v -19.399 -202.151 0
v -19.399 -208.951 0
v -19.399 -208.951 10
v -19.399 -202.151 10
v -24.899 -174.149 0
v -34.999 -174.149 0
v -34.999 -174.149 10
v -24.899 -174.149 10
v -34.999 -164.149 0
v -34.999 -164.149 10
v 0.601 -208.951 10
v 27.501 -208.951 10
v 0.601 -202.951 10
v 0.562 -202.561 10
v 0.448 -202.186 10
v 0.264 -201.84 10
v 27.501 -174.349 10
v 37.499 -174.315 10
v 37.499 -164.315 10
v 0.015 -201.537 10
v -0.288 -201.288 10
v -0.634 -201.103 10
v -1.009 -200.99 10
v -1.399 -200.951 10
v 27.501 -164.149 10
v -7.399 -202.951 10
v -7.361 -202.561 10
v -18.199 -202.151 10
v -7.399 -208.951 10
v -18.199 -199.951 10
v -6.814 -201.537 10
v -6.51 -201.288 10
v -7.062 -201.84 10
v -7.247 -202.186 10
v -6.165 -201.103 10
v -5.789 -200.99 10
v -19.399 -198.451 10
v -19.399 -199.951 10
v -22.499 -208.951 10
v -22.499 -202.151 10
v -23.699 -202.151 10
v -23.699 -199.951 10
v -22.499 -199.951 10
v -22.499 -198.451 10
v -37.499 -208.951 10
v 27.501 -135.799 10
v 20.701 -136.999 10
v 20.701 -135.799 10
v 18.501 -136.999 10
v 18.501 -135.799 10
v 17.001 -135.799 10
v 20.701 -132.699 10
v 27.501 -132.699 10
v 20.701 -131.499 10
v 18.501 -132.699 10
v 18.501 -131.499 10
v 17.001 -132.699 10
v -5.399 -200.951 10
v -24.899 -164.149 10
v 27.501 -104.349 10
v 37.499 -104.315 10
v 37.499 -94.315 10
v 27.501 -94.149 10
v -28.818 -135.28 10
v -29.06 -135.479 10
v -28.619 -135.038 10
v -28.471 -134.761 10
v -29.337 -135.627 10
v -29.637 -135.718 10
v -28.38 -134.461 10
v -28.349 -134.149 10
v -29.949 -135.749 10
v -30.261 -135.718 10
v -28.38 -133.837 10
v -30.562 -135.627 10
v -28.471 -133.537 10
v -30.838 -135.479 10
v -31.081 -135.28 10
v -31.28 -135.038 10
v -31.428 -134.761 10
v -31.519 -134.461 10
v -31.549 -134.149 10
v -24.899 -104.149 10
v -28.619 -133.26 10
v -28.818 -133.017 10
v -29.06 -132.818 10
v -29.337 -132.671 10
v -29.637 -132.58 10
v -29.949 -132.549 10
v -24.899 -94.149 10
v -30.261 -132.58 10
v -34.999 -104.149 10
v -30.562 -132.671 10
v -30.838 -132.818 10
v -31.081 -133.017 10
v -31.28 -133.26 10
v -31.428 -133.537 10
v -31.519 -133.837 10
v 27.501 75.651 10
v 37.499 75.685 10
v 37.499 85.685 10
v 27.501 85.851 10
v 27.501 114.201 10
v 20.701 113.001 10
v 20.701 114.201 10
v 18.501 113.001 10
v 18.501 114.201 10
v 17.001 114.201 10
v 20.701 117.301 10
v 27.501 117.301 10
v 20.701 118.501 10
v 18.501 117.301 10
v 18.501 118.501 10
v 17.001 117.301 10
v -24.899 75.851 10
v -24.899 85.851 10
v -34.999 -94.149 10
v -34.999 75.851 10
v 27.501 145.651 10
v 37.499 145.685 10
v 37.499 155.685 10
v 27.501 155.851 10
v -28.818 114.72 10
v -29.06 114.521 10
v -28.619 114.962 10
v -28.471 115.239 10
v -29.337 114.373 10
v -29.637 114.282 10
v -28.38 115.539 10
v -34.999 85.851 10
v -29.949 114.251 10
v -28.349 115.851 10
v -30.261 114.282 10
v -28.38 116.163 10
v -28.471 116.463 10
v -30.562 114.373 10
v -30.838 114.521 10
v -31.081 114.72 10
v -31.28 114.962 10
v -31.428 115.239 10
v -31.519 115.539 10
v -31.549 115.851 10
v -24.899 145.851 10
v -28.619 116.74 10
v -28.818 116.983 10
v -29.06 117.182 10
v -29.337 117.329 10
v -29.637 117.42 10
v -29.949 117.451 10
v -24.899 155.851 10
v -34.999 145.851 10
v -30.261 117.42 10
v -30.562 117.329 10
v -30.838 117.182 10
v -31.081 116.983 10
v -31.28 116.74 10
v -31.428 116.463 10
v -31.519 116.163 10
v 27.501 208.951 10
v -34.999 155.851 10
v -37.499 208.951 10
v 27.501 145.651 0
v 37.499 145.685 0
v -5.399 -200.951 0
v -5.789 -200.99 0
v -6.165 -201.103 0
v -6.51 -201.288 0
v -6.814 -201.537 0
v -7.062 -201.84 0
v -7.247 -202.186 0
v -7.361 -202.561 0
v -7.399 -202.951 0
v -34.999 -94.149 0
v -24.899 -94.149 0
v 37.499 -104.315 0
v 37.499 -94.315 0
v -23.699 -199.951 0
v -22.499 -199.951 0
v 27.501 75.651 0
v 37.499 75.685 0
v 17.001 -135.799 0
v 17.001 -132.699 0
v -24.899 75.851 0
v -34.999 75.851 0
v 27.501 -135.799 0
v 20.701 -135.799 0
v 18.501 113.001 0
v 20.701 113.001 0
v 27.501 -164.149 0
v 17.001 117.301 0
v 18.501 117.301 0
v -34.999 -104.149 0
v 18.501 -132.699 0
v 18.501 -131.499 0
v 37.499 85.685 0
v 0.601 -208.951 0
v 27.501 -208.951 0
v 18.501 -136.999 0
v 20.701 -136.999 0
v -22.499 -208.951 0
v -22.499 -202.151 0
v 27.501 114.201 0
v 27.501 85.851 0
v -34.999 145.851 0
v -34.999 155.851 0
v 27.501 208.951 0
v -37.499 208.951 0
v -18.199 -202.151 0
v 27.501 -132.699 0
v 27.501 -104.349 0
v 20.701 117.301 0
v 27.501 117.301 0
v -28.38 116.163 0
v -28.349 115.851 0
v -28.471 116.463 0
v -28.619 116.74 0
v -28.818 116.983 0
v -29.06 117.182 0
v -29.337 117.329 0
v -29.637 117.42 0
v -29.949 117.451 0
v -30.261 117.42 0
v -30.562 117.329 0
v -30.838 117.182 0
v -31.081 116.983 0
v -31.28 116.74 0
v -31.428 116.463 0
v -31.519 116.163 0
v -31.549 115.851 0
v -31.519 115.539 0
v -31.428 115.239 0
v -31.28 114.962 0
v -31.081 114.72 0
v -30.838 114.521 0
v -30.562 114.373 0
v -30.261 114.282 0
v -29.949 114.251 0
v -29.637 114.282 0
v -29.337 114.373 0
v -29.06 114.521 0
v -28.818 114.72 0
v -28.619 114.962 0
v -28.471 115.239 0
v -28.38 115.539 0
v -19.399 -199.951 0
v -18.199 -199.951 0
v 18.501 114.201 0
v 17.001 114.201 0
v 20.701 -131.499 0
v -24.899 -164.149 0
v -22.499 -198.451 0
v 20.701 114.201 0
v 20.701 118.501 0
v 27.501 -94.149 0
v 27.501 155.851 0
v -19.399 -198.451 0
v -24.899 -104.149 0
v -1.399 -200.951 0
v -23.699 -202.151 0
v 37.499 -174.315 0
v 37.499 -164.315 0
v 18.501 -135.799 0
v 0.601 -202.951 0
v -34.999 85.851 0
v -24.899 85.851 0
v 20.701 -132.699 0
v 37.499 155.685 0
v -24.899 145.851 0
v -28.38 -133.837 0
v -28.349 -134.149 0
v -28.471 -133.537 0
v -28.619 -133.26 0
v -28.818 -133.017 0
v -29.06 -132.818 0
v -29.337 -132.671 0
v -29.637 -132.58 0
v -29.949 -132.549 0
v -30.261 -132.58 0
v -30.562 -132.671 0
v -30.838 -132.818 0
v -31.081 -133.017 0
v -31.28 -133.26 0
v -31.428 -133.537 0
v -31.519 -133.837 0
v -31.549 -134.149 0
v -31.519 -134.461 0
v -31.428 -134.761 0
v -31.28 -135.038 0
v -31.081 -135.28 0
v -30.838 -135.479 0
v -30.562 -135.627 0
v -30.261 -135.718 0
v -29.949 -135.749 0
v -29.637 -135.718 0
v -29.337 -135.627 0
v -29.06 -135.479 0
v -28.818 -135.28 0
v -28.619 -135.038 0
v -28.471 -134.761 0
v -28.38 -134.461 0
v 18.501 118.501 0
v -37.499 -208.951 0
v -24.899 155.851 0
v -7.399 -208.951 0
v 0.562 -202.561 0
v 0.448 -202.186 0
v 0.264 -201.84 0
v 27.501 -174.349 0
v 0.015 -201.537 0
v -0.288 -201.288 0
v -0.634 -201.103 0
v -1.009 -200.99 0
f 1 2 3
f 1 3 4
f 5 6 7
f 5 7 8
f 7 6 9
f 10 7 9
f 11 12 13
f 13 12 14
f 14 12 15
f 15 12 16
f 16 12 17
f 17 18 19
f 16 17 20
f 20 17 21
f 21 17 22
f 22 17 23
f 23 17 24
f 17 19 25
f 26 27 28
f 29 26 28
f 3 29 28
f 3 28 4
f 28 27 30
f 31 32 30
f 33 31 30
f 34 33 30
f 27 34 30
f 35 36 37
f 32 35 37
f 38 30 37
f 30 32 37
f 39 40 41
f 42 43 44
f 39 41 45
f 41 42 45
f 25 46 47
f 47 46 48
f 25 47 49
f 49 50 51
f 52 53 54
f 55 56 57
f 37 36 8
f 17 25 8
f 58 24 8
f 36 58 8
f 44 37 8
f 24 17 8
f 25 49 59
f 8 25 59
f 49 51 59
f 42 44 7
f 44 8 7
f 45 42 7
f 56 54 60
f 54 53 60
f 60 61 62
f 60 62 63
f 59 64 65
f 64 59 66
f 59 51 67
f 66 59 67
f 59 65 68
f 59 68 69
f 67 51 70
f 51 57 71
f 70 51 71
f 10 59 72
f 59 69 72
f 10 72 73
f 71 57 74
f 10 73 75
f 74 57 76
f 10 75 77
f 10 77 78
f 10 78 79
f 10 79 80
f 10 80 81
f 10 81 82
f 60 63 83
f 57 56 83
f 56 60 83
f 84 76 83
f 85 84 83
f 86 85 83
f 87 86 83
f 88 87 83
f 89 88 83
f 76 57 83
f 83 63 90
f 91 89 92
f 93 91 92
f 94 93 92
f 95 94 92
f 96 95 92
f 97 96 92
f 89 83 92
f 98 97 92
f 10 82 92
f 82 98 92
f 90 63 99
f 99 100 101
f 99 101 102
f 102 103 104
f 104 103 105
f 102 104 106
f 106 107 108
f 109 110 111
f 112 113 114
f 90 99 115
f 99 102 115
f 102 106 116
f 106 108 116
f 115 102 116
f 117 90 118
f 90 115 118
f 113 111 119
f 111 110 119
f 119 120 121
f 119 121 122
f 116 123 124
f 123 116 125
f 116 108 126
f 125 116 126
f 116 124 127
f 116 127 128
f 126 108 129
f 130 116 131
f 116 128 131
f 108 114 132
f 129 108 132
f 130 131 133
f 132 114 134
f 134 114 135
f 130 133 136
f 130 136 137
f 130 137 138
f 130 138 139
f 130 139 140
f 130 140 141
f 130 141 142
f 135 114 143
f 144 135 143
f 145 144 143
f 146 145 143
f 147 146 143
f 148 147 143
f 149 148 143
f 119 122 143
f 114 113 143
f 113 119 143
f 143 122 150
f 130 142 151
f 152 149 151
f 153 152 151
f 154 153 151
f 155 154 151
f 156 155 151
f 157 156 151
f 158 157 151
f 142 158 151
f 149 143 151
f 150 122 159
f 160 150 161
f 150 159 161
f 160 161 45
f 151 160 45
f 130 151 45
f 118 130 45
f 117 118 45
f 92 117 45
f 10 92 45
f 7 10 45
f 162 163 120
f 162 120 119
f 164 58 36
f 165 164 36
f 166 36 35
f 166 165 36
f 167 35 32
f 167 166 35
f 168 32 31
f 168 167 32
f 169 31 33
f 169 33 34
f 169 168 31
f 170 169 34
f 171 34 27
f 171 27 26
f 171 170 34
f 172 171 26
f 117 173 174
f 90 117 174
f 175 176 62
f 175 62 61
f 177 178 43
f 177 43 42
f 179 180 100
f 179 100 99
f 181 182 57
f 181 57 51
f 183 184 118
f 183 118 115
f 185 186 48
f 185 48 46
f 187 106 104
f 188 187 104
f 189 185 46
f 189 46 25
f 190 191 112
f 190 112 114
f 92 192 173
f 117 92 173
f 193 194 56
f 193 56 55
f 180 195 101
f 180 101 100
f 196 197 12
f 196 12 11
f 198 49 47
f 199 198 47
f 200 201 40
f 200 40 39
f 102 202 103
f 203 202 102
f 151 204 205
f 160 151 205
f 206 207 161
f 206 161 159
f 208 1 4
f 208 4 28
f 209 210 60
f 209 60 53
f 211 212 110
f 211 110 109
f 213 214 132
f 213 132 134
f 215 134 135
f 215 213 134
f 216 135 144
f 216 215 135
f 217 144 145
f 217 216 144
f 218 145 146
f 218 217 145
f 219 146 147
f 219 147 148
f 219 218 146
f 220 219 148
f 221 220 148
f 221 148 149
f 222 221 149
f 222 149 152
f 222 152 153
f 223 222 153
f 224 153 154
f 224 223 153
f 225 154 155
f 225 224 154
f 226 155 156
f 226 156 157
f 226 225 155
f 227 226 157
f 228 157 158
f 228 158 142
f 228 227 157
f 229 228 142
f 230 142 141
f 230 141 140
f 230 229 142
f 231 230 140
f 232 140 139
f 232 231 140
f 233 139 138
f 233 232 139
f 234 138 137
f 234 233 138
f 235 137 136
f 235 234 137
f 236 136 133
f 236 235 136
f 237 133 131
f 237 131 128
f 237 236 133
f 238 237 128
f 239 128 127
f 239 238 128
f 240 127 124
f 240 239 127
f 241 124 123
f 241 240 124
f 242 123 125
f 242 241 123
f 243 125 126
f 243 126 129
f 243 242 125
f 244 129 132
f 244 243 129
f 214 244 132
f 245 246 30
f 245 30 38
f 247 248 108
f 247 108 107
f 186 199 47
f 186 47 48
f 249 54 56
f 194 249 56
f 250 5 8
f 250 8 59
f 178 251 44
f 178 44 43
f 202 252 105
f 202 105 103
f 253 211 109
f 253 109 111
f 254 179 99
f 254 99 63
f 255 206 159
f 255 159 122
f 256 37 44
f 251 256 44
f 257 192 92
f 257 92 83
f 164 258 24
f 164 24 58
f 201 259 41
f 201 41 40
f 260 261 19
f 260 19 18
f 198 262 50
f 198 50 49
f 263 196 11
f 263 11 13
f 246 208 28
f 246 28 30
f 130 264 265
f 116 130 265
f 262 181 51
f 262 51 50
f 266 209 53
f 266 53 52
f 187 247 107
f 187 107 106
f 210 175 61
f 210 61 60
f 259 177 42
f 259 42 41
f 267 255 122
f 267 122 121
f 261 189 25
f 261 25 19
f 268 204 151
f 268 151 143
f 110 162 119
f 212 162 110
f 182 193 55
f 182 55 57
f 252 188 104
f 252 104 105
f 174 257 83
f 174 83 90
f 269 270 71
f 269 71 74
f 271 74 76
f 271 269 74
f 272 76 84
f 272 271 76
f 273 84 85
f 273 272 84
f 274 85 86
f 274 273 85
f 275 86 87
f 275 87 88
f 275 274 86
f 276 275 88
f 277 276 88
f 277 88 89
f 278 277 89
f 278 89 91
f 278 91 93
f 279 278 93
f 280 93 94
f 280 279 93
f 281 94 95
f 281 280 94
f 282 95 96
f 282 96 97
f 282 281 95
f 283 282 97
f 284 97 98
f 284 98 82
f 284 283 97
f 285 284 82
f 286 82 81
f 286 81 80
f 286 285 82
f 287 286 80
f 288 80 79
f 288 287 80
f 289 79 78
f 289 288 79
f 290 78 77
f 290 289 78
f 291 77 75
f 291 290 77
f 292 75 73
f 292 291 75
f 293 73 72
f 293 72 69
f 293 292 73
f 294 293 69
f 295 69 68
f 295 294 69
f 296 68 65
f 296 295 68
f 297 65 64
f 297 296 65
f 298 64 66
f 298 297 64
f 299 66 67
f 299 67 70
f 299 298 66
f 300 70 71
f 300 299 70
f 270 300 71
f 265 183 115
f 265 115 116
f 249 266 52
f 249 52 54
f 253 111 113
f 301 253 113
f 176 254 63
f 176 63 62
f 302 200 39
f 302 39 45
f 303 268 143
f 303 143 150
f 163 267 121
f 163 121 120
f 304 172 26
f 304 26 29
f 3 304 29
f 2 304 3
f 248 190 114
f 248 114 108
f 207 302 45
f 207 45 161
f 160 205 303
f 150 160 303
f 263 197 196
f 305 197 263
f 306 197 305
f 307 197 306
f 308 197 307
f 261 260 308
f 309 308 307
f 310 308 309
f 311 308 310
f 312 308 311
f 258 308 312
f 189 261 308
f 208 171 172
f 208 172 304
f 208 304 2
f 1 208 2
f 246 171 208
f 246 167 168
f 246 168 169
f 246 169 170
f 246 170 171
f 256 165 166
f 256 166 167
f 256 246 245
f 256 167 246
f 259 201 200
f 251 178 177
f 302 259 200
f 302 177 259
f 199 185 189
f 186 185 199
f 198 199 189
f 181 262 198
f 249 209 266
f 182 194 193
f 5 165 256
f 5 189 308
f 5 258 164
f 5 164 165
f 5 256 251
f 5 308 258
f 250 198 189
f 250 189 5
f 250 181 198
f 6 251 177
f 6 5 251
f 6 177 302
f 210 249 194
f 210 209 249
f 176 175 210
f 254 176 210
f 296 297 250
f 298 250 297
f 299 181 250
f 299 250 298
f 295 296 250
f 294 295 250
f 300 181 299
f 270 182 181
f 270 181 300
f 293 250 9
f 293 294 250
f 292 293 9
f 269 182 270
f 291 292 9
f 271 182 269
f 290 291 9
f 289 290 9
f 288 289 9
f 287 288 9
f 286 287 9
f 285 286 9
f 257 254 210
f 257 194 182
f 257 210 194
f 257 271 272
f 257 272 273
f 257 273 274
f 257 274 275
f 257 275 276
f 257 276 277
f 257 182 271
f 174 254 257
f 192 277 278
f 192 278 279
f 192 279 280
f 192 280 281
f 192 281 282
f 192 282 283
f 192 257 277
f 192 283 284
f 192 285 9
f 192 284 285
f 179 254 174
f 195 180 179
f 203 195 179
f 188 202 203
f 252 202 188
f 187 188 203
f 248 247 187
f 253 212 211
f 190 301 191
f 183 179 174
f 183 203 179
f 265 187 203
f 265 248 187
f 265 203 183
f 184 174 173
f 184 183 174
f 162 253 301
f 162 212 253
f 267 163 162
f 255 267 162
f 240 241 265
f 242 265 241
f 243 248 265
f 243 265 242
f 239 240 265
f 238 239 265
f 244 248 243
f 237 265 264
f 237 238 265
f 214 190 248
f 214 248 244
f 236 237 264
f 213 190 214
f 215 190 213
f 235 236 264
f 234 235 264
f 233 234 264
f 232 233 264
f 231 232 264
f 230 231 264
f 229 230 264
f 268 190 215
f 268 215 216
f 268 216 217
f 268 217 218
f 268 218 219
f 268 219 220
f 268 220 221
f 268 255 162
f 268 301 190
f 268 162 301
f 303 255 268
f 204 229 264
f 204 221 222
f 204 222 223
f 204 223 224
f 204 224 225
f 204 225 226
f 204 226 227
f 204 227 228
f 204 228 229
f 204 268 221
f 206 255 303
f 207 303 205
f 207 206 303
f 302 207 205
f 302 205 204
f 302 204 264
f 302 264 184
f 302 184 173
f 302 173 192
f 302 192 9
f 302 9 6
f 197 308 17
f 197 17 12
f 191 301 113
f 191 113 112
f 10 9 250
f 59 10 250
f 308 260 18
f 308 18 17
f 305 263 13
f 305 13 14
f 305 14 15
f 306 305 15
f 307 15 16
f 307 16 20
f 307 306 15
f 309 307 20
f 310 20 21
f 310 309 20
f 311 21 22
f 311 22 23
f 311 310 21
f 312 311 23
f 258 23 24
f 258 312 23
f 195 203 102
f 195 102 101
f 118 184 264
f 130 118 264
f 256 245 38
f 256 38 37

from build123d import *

# Parameters (mm, degrees)
SKETCH_1_R      = 1.6
SKETCH_1_W      = 10.1
SKETCH_1_H      = 10
EXTRUDE_1_DEPTH = 10


with BuildPart() as part:
    # Эскиз1 → Бобышка-Вытянуть1 (new body)
    with BuildSketch(Plane.XY):
        with BuildLine():
            Line((-37.4993057, -208.951162), (-37.4993057, 208.951162))
            Line((-37.4993057, 208.951162), (27.5006943, 208.951162))
            Line((27.5006943, 208.951162), (27.5006943, 155.851162))
            Line((27.5006943, 155.851162), (37.4993057, 155.684518477))
            Line((37.4993057, 155.684518477), (37.4993057, 145.684518477))
            Line((37.4993057, 145.684518477), (27.5006943, 145.651162))
            Line((27.5006943, 145.651162), (27.5006943, 117.301162))
            Line((27.5006943, 117.301162), (20.7006943, 117.301162))
            Line((20.7006943, 117.301162), (20.7006943, 118.501162))
            Line((20.7006943, 118.501162), (18.5006943, 118.501162))
            Line((18.5006943, 118.501162), (18.5006943, 117.301162))
            Line((18.5006943, 117.301162), (17.0006943, 117.301162))
            Line((17.0006943, 117.301162), (17.0006943, 114.201162))
            Line((17.0006943, 114.201162), (18.5006943, 114.201162))
            Line((18.5006943, 114.201162), (18.5006943, 113.001162))
            Line((18.5006943, 113.001162), (20.7006943, 113.001162))
            Line((20.7006943, 113.001162), (20.7006943, 114.201162))
            Line((20.7006943, 114.201162), (27.5006943, 114.201162))
            Line((27.5006943, 114.201162), (27.5006943, 85.851162))
            Line((27.5006943, 85.851162), (37.4993057, 85.684518477))
            Line((37.4993057, 85.684518477), (37.4993057, 75.684518477))
            Line((37.4993057, 75.684518477), (27.5006943, 75.651162))
            Line((27.5006943, 75.651162), (27.5006943, -94.148838))
            Line((27.5006943, -94.148838), (37.4993057, -94.315481523))
            Line((37.4993057, -94.315481523), (37.4993057, -104.315481523))
            Line((37.4993057, -104.315481523), (27.5006943, -104.348838))
            Line((27.5006943, -104.348838), (27.5006943, -132.698838))
            Line((27.5006943, -132.698838), (20.7006943, -132.698838))
            Line((20.7006943, -132.698838), (20.7006943, -131.498838))
            Line((20.7006943, -131.498838), (18.5006943, -131.498838))
            Line((18.5006943, -131.498838), (18.5006943, -132.698838))
            Line((18.5006943, -132.698838), (17.0006943, -132.698838))
            Line((17.0006943, -132.698838), (17.0006943, -135.798838))
            Line((17.0006943, -135.798838), (18.5006943, -135.798838))
            Line((18.5006943, -135.798838), (18.5006943, -136.998838))
            Line((18.5006943, -136.998838), (20.7006943, -136.998838))
            Line((20.7006943, -136.998838), (20.7006943, -135.798838))
            Line((20.7006943, -135.798838), (27.5006943, -135.798838))
            Line((27.5006943, -135.798838), (27.5006943, -164.148838))
            Line((27.5006943, -164.148838), (37.4993057, -164.315481523))
            Line((37.4993057, -164.315481523), (37.4993057, -174.315481523))
            Line((37.4993057, -174.315481523), (27.5006943, -174.348838))
            Line((27.5006943, -174.348838), (27.5006943, -208.951162))
            Line((27.5006943, -208.951162), (0.6006943, -208.951162))
            Line((0.6006943, -208.951162), (0.6006943, -202.951162))
            ThreePointArc((0.6006943, -202.951162), (0.014907862, -201.536948438), (-1.3993057, -200.951162))
            Line((-1.3993057, -200.951162), (-5.3993057, -200.951162))
            ThreePointArc((-5.3993057, -200.951162), (-6.813519263, -201.536948438), (-7.3993057, -202.951162))
            Line((-7.3993057, -202.951162), (-7.3993057, -208.951162))
            Line((-7.3993057, -208.951162), (-19.3993057, -208.951162))
            Line((-19.3993057, -208.951162), (-19.3993057, -202.151162))
            Line((-19.3993057, -202.151162), (-18.1993057, -202.151162))
            Line((-18.1993057, -202.151162), (-18.1993057, -199.951162))
            Line((-18.1993057, -199.951162), (-19.3993057, -199.951162))
            Line((-19.3993057, -199.951162), (-19.3993057, -198.451162))
            Line((-19.3993057, -198.451162), (-22.4993057, -198.451162))
            Line((-22.4993057, -198.451162), (-22.4993057, -199.951162))
            Line((-22.4993057, -199.951162), (-23.6993057, -199.951162))
            Line((-23.6993057, -199.951162), (-23.6993057, -202.151162))
            Line((-23.6993057, -202.151162), (-22.4993057, -202.151162))
            Line((-22.4993057, -202.151162), (-22.4993057, -208.951162))
            Line((-22.4993057, -208.951162), (-37.4993057, -208.951162))
        make_face()
        with Locations((-29.9493057, 115.851162)):
            Circle(SKETCH_1_R, mode=Mode.SUBTRACT)
        with Locations((-29.9493057, -134.148838)):
            Circle(SKETCH_1_R, mode=Mode.SUBTRACT)
        with Locations((-29.9493057, 150.851162)):
            Rectangle(SKETCH_1_W, SKETCH_1_H, mode=Mode.SUBTRACT)
        with Locations((-29.9493057, -169.148838)):
            Rectangle(SKETCH_1_W, SKETCH_1_H, mode=Mode.SUBTRACT)
        with Locations((-29.9493057, 80.851162)):
            Rectangle(SKETCH_1_W, SKETCH_1_H, mode=Mode.SUBTRACT)
        with Locations((-29.9493057, -99.148838)):
            Rectangle(SKETCH_1_W, SKETCH_1_H, mode=Mode.SUBTRACT)
    extrude(amount=EXTRUDE_1_DEPTH)


solid = part.part
